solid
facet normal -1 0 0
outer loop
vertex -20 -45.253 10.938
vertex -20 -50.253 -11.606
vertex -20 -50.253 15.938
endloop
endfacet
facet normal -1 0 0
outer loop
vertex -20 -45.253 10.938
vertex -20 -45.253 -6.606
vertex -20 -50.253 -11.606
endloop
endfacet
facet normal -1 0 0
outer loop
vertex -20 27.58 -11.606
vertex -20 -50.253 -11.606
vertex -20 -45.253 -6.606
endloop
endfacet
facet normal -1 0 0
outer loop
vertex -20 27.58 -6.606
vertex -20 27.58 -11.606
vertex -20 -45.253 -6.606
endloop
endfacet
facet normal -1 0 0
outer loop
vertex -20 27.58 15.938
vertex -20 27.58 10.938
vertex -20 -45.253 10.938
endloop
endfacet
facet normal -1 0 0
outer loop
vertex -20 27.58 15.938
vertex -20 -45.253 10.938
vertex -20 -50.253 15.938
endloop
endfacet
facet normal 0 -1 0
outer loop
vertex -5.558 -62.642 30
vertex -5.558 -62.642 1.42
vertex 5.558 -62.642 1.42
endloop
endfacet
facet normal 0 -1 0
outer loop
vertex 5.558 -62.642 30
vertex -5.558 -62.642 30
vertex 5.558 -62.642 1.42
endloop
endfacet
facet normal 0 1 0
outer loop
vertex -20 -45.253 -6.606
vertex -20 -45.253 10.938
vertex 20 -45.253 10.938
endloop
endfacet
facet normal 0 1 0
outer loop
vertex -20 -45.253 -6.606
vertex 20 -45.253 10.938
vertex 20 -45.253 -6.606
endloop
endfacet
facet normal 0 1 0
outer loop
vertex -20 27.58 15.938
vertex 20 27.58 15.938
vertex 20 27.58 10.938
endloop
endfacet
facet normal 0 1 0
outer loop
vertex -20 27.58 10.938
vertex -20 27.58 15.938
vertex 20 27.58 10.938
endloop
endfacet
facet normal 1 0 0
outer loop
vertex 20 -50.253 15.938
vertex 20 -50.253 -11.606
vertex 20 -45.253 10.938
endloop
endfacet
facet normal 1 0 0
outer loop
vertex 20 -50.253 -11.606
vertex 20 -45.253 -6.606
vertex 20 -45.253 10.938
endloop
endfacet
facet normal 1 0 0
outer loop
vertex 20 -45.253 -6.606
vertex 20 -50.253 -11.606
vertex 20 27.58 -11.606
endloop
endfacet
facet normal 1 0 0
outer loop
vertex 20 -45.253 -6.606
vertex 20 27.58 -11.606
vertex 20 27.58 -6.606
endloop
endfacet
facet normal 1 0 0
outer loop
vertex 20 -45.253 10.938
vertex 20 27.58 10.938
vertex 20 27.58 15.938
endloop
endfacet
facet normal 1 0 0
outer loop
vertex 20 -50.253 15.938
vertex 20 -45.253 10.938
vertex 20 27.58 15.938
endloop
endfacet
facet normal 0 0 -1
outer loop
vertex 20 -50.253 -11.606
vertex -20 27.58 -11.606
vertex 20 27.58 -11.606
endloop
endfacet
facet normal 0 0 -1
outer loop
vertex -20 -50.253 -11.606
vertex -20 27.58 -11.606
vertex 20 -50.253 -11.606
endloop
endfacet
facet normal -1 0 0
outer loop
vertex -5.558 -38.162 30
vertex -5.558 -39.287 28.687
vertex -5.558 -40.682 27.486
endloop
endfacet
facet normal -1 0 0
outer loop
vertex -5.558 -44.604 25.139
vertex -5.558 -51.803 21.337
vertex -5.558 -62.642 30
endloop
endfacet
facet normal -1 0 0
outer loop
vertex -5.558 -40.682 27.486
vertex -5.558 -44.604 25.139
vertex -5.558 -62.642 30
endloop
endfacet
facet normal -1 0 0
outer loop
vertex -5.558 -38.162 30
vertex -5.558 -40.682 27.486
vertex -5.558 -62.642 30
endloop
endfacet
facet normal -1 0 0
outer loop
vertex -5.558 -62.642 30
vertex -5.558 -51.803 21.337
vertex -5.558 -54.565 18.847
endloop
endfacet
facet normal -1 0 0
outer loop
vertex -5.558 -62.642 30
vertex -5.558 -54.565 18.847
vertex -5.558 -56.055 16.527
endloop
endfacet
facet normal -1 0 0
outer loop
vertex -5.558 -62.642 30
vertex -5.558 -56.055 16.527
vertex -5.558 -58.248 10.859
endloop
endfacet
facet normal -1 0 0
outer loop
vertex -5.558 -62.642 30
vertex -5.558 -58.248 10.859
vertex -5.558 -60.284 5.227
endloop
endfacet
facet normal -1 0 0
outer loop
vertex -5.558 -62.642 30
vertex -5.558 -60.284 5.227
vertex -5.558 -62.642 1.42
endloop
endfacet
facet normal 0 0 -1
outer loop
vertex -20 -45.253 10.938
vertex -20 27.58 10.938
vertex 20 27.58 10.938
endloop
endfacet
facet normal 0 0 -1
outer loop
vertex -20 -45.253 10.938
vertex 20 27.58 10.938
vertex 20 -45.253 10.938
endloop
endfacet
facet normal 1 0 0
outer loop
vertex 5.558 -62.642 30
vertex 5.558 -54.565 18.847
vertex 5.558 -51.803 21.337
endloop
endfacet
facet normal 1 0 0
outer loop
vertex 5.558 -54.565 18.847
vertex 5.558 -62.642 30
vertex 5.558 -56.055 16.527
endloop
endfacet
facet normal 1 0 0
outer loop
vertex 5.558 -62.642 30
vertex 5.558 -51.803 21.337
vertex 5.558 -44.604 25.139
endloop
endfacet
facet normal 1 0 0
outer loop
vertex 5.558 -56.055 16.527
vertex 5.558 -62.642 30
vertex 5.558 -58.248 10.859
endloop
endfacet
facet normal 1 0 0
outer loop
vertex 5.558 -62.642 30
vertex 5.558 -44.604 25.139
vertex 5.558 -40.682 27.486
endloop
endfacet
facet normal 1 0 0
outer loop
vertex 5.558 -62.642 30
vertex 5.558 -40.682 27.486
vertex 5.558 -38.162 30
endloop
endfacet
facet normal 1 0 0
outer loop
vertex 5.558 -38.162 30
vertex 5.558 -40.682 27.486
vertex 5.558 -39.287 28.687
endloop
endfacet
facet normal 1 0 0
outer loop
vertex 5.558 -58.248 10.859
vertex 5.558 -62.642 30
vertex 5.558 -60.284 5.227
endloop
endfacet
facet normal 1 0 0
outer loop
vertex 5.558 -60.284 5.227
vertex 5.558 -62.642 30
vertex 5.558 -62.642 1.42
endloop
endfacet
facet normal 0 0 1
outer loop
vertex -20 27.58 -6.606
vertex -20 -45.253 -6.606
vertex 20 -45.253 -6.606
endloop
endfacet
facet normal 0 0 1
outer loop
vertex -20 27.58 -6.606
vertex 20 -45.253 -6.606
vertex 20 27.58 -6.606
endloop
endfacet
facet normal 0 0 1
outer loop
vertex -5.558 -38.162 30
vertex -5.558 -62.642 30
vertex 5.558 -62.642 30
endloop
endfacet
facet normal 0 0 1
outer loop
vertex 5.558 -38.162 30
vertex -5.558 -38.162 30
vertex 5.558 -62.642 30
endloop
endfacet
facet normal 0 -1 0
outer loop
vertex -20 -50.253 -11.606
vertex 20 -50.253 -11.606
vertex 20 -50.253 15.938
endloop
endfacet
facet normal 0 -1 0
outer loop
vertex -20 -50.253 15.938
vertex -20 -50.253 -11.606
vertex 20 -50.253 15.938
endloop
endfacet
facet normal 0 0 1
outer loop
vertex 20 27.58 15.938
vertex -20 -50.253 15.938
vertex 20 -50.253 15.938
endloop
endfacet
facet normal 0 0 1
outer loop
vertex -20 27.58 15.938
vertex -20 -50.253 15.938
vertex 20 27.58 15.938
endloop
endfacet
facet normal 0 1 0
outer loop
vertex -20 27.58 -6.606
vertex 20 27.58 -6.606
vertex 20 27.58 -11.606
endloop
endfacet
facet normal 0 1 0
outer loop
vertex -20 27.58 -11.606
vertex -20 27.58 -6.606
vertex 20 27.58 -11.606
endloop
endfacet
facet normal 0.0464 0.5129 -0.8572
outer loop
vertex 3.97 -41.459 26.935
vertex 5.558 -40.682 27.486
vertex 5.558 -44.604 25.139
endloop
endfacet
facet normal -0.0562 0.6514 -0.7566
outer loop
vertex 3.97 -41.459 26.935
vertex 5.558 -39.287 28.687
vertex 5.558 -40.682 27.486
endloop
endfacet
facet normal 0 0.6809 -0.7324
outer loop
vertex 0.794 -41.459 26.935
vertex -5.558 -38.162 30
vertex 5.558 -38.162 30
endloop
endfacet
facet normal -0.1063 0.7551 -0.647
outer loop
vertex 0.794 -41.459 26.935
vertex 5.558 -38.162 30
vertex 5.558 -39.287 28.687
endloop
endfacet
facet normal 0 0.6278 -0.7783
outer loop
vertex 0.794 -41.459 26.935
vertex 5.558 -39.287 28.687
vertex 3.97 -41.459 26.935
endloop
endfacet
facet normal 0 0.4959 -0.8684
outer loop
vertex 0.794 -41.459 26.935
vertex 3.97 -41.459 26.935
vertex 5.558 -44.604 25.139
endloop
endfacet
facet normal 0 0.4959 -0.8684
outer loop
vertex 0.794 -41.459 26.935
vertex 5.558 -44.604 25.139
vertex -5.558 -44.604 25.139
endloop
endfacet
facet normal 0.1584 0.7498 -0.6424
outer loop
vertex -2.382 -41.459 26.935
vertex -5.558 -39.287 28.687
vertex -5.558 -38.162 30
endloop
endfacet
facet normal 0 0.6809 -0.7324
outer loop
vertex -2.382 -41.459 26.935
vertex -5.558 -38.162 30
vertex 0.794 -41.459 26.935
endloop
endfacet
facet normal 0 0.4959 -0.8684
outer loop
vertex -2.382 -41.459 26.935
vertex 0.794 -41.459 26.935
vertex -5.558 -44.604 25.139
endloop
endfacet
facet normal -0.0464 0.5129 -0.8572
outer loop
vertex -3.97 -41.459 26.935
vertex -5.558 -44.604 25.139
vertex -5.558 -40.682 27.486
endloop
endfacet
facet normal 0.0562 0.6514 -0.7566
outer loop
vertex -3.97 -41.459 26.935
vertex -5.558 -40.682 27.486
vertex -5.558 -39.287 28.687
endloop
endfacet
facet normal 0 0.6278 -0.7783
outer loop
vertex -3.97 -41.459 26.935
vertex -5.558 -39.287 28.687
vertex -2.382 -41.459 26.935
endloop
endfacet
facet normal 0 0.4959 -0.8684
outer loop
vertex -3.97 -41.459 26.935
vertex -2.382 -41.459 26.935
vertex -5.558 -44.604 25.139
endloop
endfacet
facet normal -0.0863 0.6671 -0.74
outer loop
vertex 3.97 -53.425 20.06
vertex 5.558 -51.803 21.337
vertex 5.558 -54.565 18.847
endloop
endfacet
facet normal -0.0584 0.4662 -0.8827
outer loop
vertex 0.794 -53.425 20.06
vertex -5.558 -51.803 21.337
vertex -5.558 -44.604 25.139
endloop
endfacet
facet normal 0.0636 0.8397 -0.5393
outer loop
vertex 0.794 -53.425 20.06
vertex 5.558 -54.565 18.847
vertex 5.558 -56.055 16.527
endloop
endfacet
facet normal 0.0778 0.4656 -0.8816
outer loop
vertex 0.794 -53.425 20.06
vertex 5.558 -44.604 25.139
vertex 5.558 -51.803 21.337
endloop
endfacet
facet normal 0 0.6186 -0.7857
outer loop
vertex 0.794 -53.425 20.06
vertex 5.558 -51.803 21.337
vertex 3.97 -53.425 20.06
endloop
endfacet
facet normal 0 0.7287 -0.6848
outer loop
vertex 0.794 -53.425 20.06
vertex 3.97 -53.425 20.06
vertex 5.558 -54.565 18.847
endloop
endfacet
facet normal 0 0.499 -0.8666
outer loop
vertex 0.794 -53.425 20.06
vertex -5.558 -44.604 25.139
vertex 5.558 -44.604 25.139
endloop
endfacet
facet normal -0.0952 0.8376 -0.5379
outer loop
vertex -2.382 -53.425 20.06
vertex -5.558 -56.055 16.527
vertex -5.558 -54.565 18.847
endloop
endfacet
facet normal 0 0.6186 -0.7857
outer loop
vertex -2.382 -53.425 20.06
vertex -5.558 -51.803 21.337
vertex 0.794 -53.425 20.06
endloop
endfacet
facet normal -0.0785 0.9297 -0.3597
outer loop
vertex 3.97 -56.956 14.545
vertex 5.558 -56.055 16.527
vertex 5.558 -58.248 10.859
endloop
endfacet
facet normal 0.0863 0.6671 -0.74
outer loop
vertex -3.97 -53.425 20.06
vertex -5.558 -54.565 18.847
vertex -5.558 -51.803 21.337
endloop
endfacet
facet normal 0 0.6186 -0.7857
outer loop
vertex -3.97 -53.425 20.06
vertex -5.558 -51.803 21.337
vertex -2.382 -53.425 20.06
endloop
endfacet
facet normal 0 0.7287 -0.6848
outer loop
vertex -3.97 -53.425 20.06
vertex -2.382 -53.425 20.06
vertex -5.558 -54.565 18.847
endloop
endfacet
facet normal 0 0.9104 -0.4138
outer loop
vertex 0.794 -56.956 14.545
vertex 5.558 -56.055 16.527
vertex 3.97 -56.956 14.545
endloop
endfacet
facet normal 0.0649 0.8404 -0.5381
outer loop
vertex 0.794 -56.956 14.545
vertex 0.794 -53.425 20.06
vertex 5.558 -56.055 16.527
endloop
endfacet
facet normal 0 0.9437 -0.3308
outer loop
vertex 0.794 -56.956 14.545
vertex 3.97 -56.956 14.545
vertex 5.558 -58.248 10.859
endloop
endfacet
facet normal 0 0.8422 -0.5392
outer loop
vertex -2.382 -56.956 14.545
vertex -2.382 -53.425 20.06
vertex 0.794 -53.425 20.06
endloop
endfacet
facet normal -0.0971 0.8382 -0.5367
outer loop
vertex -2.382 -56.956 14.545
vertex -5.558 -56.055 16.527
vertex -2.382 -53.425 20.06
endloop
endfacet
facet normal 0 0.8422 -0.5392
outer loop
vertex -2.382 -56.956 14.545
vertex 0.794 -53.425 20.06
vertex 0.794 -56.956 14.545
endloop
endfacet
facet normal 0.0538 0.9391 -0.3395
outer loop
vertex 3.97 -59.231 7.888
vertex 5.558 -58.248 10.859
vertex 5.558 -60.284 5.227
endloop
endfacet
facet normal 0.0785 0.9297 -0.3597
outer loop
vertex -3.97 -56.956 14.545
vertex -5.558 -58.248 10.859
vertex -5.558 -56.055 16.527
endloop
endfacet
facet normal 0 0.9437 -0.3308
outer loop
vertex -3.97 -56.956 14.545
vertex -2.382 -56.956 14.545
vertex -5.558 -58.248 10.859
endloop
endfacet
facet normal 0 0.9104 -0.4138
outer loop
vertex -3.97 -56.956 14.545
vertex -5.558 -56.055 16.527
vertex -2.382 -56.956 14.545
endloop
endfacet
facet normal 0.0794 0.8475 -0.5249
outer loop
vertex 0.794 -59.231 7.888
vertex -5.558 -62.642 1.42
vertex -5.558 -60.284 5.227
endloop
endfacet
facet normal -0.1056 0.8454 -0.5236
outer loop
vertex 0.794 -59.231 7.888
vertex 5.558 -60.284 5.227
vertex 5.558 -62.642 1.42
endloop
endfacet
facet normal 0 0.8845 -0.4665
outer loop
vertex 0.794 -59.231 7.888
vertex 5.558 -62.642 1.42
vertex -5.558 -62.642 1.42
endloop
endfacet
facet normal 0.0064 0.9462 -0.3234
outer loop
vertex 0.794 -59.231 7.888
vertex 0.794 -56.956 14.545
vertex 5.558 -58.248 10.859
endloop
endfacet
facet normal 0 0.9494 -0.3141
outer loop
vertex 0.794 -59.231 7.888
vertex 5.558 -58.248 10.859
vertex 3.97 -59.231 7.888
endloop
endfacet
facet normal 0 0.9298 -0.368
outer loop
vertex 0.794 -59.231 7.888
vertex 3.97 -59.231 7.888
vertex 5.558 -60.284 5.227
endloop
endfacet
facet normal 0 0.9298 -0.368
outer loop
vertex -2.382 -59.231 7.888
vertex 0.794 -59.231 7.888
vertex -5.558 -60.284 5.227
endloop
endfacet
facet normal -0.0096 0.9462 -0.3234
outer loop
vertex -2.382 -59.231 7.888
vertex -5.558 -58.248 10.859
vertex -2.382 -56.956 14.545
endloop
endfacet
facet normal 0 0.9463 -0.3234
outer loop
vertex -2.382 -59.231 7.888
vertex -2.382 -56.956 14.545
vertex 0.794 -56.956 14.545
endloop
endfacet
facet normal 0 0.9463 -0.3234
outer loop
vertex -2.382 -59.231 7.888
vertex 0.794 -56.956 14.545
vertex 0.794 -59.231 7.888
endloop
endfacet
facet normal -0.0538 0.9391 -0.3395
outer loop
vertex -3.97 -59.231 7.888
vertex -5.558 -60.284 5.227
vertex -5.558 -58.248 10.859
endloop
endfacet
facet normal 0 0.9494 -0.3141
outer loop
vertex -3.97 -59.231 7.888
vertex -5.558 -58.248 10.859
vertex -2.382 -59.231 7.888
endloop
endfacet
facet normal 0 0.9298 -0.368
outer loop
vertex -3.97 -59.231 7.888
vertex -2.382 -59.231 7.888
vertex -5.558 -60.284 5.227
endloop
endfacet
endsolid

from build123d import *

# Parameters (mm, degrees)
EXTRUDE_5_DEPTH      = 30
EXTRUDE_5_DEPTH_BACK = 30
F_1_FR_R             = 5
EXTRUDE_6_DEPTH      = 20
EXTRUDE_6_DEPTH_BACK = 20
OTHER_START          = -15
OTHER_2_DEPTH        = 30


# Read off the part's stored shape, not the designer's step: Отступ2
with BuildPart() as part:
    # Эскиз1_fr → Бобышка-Вытянуть5 (new, two sides: drawn at the far end of the back side and taken through both)
    with BuildSketch(Plane.XY.offset(-EXTRUDE_5_DEPTH_BACK)):
        with BuildLine():
            Line((-5.557606452, -13.932444528), (-5.557606452, -62.642280008))
            Line((-5.557606452, -62.642280008), (5.557606452, -62.642280008))
            Line((5.557606452, -62.642280008), (5.557606452, -13.932444528))
            ThreePointArc((5.557606452, -13.932444528), (0, 15), (-5.557606452, -13.932444528))
        make_face()
        Circle(F_1_FR_R, mode=Mode.SUBTRACT)
    extrude(amount=EXTRUDE_5_DEPTH + EXTRUDE_5_DEPTH_BACK)

    # Отступ2 outline → Отступ2 (cut)
    with BuildSketch(Plane.YZ.offset(OTHER_START)):
        with BuildLine():
            Line((16, 30), (-38.162129208, 30.000000201))
            add(Edge.make_bspline(
                [(-38.162129208, 30.000000201), (-38.350412386, 29.738589195), (-38.547242858, 29.484853366), (-38.752299072, 29.238505312), (-38.965259498, 28.99925828), (-39.185802485, 28.766826159), (-39.413606123, 28.540923423), (-39.64834813, 28.32126501), (-39.889705768, 28.107566173), (-40.137355811, 27.899542297), (-40.39097457, 27.696908743), (-40.650238001, 27.499380765), (-40.914821881, 27.306673579), (-41.184402075, 27.11850268), (-42.265778691, 26.393314992), (-43.113368902, 25.888872388), (-43.99315142, 25.414009108), (-44.896841535, 24.96146191), (-45.816149017, 24.523958449), (-46.742782565, 24.094220219), (-47.668453227, 23.664962906), (-48.584876381, 23.228895124), (-49.483771918, 22.778716473), (-50.356862203, 22.30711592), (-51.195867455, 21.806771428), (-51.992498133, 21.270351842), (-52.73844395, 20.690521946), (-53.511223517, 19.981130426), (-53.596170911, 19.901516083), (-53.680123568, 19.821092243), (-53.763413941, 19.739889031), (-53.844744398, 19.657606996), (-53.927459143, 19.575304006), (-54.004978314, 19.490233908), (-54.086963112, 19.407352212), (-54.162711198, 19.320126258), (-54.240798044, 19.234583034), (-54.316342943, 19.146873901), (-54.391361142, 19.058753339), (-54.465300564, 18.969694587), (-54.611255963, 18.789935065), (-54.683262919, 18.699224485), (-54.754314107, 18.607695324), (-54.824424506, 18.515359819), (-54.893609092, 18.422230207), (-54.961882842, 18.328318725), (-55.029260732, 18.233637612), (-55.095757741, 18.138199104), (-55.161388843, 18.042015438), (-55.226169019, 17.945098853), (-55.290113242, 17.847461585), (-55.353236491, 17.749115872), (-55.415553743, 17.650073952), (-55.600132437, 17.350896278), (-55.720020886, 17.148708437), (-55.836865309, 16.943882089), (-55.950785669, 16.736514739), (-56.061901911, 16.526703843), (-56.170333957, 16.31454681), (-56.276201707, 16.100141), (-56.379625042, 15.883583727), (-56.480723817, 15.664972254), (-56.579617872, 15.444403799), (-56.676427019, 15.221975529), (-56.771271052, 14.997784566), (-56.864269745, 14.771927983), (-57.138089051, 14.089652446), (-57.313732951, 13.628528404), (-57.48343208, 13.161907014), (-57.648143574, 12.690564713), (-57.808824172, 12.215278032), (-57.966430218, 11.736823601), (-58.121917654, 11.255978148), (-58.276242029, 10.773518498), (-58.430358494, 10.290221572), (-58.585221804, 9.806864391), (-58.741786314, 9.324224071), (-58.901005985, 8.843077827), (-59.063834379, 8.364202972), (-59.410471901, 7.378846098), (-59.594949774, 6.872811052), (-59.785830162, 6.371227061), (-59.984282319, 5.875048562), (-60.19147505, 5.385229705), (-60.408577178, 4.902724584), (-60.636757277, 4.428487146), (-60.877183329, 3.963470844), (-61.131022629, 3.508628159), (-61.399442059, 3.064910118), (-61.683608675, 2.633265954), (-61.984690452, 2.214643016), (-62.303856996, 1.809986968), (-62.642280061, 1.420242276)],
                knots=[0.165052435, 0.165052435, 0.165052435, 0.165052435, 0.165052435, 0.165052435, 0.165052435, 0.165052435, 0.165052435, 0.165052435, 0.165052435, 0.165052435, 0.165052435, 0.165052435, 0.165052435, 0.25, 0.25, 0.25, 0.25, 0.25, 0.25, 0.25, 0.25, 0.25, 0.25, 0.25, 0.25, 0.25, 0.5, 0.5, 0.5, 0.5, 0.5, 0.5, 0.5, 0.5, 0.5, 0.5, 0.5, 0.5, 0.5, 0.53125, 0.53125, 0.53125, 0.53125, 0.53125, 0.53125, 0.53125, 0.53125, 0.53125, 0.53125, 0.53125, 0.53125, 0.53125, 0.5625, 0.5625, 0.5625, 0.5625, 0.5625, 0.5625, 0.5625, 0.5625, 0.5625, 0.5625, 0.5625, 0.5625, 0.5625, 0.625, 0.625, 0.625, 0.625, 0.625, 0.625, 0.625, 0.625, 0.625, 0.625, 0.625, 0.625, 0.625, 0.75, 0.75, 0.75, 0.75, 0.75, 0.75, 0.75, 0.75, 0.75, 0.75, 0.75, 0.75, 0.75, 0.883854275, 0.883854275, 0.883854275, 0.883854275, 0.883854275, 0.883854275, 0.883854275, 0.883854275, 0.883854275, 0.883854275, 0.883854275, 0.883854275, 0.883854275, 0.883854275, 0.883854275], degree=14))
            Line((-62.642280061, 1.420242276), (-62.642280008, -30))
            Line((-62.642280008, -30), (16, -30))
            Line((16, -30), (16, 30))
        make_face()
    extrude(amount=OTHER_2_DEPTH, mode=Mode.SUBTRACT)


with BuildPart() as body_2:
    # Эскиз3 → Бобышка-Вытянуть6 (new, two sides: drawn at the far end of the back side and taken through both)
    with BuildSketch(Plane(origin=(0, 0, 0), x_dir=(0, 0, -1), z_dir=(1, 0, 0)).offset(-EXTRUDE_6_DEPTH_BACK)):
        Polygon((-58.394498043, -50.25314581), (-85.938130262, -50.25314581), (-85.938130262, 27.580465306), (-80.938130262, 27.580465306), (-80.938130262, -45.25314581), (-63.394498043, -45.25314581), (-63.394498043, 27.580465306), (-58.394498043, 27.580465306), align=None)
    extrude(amount=EXTRUDE_6_DEPTH + EXTRUDE_6_DEPTH_BACK)


with BuildPart() as body_2_1:
    # Move Body 1: moved
    add(body_2.part.moved(Location((0, 0, -70))))


solid = Compound([part.part, body_2_1.part])
